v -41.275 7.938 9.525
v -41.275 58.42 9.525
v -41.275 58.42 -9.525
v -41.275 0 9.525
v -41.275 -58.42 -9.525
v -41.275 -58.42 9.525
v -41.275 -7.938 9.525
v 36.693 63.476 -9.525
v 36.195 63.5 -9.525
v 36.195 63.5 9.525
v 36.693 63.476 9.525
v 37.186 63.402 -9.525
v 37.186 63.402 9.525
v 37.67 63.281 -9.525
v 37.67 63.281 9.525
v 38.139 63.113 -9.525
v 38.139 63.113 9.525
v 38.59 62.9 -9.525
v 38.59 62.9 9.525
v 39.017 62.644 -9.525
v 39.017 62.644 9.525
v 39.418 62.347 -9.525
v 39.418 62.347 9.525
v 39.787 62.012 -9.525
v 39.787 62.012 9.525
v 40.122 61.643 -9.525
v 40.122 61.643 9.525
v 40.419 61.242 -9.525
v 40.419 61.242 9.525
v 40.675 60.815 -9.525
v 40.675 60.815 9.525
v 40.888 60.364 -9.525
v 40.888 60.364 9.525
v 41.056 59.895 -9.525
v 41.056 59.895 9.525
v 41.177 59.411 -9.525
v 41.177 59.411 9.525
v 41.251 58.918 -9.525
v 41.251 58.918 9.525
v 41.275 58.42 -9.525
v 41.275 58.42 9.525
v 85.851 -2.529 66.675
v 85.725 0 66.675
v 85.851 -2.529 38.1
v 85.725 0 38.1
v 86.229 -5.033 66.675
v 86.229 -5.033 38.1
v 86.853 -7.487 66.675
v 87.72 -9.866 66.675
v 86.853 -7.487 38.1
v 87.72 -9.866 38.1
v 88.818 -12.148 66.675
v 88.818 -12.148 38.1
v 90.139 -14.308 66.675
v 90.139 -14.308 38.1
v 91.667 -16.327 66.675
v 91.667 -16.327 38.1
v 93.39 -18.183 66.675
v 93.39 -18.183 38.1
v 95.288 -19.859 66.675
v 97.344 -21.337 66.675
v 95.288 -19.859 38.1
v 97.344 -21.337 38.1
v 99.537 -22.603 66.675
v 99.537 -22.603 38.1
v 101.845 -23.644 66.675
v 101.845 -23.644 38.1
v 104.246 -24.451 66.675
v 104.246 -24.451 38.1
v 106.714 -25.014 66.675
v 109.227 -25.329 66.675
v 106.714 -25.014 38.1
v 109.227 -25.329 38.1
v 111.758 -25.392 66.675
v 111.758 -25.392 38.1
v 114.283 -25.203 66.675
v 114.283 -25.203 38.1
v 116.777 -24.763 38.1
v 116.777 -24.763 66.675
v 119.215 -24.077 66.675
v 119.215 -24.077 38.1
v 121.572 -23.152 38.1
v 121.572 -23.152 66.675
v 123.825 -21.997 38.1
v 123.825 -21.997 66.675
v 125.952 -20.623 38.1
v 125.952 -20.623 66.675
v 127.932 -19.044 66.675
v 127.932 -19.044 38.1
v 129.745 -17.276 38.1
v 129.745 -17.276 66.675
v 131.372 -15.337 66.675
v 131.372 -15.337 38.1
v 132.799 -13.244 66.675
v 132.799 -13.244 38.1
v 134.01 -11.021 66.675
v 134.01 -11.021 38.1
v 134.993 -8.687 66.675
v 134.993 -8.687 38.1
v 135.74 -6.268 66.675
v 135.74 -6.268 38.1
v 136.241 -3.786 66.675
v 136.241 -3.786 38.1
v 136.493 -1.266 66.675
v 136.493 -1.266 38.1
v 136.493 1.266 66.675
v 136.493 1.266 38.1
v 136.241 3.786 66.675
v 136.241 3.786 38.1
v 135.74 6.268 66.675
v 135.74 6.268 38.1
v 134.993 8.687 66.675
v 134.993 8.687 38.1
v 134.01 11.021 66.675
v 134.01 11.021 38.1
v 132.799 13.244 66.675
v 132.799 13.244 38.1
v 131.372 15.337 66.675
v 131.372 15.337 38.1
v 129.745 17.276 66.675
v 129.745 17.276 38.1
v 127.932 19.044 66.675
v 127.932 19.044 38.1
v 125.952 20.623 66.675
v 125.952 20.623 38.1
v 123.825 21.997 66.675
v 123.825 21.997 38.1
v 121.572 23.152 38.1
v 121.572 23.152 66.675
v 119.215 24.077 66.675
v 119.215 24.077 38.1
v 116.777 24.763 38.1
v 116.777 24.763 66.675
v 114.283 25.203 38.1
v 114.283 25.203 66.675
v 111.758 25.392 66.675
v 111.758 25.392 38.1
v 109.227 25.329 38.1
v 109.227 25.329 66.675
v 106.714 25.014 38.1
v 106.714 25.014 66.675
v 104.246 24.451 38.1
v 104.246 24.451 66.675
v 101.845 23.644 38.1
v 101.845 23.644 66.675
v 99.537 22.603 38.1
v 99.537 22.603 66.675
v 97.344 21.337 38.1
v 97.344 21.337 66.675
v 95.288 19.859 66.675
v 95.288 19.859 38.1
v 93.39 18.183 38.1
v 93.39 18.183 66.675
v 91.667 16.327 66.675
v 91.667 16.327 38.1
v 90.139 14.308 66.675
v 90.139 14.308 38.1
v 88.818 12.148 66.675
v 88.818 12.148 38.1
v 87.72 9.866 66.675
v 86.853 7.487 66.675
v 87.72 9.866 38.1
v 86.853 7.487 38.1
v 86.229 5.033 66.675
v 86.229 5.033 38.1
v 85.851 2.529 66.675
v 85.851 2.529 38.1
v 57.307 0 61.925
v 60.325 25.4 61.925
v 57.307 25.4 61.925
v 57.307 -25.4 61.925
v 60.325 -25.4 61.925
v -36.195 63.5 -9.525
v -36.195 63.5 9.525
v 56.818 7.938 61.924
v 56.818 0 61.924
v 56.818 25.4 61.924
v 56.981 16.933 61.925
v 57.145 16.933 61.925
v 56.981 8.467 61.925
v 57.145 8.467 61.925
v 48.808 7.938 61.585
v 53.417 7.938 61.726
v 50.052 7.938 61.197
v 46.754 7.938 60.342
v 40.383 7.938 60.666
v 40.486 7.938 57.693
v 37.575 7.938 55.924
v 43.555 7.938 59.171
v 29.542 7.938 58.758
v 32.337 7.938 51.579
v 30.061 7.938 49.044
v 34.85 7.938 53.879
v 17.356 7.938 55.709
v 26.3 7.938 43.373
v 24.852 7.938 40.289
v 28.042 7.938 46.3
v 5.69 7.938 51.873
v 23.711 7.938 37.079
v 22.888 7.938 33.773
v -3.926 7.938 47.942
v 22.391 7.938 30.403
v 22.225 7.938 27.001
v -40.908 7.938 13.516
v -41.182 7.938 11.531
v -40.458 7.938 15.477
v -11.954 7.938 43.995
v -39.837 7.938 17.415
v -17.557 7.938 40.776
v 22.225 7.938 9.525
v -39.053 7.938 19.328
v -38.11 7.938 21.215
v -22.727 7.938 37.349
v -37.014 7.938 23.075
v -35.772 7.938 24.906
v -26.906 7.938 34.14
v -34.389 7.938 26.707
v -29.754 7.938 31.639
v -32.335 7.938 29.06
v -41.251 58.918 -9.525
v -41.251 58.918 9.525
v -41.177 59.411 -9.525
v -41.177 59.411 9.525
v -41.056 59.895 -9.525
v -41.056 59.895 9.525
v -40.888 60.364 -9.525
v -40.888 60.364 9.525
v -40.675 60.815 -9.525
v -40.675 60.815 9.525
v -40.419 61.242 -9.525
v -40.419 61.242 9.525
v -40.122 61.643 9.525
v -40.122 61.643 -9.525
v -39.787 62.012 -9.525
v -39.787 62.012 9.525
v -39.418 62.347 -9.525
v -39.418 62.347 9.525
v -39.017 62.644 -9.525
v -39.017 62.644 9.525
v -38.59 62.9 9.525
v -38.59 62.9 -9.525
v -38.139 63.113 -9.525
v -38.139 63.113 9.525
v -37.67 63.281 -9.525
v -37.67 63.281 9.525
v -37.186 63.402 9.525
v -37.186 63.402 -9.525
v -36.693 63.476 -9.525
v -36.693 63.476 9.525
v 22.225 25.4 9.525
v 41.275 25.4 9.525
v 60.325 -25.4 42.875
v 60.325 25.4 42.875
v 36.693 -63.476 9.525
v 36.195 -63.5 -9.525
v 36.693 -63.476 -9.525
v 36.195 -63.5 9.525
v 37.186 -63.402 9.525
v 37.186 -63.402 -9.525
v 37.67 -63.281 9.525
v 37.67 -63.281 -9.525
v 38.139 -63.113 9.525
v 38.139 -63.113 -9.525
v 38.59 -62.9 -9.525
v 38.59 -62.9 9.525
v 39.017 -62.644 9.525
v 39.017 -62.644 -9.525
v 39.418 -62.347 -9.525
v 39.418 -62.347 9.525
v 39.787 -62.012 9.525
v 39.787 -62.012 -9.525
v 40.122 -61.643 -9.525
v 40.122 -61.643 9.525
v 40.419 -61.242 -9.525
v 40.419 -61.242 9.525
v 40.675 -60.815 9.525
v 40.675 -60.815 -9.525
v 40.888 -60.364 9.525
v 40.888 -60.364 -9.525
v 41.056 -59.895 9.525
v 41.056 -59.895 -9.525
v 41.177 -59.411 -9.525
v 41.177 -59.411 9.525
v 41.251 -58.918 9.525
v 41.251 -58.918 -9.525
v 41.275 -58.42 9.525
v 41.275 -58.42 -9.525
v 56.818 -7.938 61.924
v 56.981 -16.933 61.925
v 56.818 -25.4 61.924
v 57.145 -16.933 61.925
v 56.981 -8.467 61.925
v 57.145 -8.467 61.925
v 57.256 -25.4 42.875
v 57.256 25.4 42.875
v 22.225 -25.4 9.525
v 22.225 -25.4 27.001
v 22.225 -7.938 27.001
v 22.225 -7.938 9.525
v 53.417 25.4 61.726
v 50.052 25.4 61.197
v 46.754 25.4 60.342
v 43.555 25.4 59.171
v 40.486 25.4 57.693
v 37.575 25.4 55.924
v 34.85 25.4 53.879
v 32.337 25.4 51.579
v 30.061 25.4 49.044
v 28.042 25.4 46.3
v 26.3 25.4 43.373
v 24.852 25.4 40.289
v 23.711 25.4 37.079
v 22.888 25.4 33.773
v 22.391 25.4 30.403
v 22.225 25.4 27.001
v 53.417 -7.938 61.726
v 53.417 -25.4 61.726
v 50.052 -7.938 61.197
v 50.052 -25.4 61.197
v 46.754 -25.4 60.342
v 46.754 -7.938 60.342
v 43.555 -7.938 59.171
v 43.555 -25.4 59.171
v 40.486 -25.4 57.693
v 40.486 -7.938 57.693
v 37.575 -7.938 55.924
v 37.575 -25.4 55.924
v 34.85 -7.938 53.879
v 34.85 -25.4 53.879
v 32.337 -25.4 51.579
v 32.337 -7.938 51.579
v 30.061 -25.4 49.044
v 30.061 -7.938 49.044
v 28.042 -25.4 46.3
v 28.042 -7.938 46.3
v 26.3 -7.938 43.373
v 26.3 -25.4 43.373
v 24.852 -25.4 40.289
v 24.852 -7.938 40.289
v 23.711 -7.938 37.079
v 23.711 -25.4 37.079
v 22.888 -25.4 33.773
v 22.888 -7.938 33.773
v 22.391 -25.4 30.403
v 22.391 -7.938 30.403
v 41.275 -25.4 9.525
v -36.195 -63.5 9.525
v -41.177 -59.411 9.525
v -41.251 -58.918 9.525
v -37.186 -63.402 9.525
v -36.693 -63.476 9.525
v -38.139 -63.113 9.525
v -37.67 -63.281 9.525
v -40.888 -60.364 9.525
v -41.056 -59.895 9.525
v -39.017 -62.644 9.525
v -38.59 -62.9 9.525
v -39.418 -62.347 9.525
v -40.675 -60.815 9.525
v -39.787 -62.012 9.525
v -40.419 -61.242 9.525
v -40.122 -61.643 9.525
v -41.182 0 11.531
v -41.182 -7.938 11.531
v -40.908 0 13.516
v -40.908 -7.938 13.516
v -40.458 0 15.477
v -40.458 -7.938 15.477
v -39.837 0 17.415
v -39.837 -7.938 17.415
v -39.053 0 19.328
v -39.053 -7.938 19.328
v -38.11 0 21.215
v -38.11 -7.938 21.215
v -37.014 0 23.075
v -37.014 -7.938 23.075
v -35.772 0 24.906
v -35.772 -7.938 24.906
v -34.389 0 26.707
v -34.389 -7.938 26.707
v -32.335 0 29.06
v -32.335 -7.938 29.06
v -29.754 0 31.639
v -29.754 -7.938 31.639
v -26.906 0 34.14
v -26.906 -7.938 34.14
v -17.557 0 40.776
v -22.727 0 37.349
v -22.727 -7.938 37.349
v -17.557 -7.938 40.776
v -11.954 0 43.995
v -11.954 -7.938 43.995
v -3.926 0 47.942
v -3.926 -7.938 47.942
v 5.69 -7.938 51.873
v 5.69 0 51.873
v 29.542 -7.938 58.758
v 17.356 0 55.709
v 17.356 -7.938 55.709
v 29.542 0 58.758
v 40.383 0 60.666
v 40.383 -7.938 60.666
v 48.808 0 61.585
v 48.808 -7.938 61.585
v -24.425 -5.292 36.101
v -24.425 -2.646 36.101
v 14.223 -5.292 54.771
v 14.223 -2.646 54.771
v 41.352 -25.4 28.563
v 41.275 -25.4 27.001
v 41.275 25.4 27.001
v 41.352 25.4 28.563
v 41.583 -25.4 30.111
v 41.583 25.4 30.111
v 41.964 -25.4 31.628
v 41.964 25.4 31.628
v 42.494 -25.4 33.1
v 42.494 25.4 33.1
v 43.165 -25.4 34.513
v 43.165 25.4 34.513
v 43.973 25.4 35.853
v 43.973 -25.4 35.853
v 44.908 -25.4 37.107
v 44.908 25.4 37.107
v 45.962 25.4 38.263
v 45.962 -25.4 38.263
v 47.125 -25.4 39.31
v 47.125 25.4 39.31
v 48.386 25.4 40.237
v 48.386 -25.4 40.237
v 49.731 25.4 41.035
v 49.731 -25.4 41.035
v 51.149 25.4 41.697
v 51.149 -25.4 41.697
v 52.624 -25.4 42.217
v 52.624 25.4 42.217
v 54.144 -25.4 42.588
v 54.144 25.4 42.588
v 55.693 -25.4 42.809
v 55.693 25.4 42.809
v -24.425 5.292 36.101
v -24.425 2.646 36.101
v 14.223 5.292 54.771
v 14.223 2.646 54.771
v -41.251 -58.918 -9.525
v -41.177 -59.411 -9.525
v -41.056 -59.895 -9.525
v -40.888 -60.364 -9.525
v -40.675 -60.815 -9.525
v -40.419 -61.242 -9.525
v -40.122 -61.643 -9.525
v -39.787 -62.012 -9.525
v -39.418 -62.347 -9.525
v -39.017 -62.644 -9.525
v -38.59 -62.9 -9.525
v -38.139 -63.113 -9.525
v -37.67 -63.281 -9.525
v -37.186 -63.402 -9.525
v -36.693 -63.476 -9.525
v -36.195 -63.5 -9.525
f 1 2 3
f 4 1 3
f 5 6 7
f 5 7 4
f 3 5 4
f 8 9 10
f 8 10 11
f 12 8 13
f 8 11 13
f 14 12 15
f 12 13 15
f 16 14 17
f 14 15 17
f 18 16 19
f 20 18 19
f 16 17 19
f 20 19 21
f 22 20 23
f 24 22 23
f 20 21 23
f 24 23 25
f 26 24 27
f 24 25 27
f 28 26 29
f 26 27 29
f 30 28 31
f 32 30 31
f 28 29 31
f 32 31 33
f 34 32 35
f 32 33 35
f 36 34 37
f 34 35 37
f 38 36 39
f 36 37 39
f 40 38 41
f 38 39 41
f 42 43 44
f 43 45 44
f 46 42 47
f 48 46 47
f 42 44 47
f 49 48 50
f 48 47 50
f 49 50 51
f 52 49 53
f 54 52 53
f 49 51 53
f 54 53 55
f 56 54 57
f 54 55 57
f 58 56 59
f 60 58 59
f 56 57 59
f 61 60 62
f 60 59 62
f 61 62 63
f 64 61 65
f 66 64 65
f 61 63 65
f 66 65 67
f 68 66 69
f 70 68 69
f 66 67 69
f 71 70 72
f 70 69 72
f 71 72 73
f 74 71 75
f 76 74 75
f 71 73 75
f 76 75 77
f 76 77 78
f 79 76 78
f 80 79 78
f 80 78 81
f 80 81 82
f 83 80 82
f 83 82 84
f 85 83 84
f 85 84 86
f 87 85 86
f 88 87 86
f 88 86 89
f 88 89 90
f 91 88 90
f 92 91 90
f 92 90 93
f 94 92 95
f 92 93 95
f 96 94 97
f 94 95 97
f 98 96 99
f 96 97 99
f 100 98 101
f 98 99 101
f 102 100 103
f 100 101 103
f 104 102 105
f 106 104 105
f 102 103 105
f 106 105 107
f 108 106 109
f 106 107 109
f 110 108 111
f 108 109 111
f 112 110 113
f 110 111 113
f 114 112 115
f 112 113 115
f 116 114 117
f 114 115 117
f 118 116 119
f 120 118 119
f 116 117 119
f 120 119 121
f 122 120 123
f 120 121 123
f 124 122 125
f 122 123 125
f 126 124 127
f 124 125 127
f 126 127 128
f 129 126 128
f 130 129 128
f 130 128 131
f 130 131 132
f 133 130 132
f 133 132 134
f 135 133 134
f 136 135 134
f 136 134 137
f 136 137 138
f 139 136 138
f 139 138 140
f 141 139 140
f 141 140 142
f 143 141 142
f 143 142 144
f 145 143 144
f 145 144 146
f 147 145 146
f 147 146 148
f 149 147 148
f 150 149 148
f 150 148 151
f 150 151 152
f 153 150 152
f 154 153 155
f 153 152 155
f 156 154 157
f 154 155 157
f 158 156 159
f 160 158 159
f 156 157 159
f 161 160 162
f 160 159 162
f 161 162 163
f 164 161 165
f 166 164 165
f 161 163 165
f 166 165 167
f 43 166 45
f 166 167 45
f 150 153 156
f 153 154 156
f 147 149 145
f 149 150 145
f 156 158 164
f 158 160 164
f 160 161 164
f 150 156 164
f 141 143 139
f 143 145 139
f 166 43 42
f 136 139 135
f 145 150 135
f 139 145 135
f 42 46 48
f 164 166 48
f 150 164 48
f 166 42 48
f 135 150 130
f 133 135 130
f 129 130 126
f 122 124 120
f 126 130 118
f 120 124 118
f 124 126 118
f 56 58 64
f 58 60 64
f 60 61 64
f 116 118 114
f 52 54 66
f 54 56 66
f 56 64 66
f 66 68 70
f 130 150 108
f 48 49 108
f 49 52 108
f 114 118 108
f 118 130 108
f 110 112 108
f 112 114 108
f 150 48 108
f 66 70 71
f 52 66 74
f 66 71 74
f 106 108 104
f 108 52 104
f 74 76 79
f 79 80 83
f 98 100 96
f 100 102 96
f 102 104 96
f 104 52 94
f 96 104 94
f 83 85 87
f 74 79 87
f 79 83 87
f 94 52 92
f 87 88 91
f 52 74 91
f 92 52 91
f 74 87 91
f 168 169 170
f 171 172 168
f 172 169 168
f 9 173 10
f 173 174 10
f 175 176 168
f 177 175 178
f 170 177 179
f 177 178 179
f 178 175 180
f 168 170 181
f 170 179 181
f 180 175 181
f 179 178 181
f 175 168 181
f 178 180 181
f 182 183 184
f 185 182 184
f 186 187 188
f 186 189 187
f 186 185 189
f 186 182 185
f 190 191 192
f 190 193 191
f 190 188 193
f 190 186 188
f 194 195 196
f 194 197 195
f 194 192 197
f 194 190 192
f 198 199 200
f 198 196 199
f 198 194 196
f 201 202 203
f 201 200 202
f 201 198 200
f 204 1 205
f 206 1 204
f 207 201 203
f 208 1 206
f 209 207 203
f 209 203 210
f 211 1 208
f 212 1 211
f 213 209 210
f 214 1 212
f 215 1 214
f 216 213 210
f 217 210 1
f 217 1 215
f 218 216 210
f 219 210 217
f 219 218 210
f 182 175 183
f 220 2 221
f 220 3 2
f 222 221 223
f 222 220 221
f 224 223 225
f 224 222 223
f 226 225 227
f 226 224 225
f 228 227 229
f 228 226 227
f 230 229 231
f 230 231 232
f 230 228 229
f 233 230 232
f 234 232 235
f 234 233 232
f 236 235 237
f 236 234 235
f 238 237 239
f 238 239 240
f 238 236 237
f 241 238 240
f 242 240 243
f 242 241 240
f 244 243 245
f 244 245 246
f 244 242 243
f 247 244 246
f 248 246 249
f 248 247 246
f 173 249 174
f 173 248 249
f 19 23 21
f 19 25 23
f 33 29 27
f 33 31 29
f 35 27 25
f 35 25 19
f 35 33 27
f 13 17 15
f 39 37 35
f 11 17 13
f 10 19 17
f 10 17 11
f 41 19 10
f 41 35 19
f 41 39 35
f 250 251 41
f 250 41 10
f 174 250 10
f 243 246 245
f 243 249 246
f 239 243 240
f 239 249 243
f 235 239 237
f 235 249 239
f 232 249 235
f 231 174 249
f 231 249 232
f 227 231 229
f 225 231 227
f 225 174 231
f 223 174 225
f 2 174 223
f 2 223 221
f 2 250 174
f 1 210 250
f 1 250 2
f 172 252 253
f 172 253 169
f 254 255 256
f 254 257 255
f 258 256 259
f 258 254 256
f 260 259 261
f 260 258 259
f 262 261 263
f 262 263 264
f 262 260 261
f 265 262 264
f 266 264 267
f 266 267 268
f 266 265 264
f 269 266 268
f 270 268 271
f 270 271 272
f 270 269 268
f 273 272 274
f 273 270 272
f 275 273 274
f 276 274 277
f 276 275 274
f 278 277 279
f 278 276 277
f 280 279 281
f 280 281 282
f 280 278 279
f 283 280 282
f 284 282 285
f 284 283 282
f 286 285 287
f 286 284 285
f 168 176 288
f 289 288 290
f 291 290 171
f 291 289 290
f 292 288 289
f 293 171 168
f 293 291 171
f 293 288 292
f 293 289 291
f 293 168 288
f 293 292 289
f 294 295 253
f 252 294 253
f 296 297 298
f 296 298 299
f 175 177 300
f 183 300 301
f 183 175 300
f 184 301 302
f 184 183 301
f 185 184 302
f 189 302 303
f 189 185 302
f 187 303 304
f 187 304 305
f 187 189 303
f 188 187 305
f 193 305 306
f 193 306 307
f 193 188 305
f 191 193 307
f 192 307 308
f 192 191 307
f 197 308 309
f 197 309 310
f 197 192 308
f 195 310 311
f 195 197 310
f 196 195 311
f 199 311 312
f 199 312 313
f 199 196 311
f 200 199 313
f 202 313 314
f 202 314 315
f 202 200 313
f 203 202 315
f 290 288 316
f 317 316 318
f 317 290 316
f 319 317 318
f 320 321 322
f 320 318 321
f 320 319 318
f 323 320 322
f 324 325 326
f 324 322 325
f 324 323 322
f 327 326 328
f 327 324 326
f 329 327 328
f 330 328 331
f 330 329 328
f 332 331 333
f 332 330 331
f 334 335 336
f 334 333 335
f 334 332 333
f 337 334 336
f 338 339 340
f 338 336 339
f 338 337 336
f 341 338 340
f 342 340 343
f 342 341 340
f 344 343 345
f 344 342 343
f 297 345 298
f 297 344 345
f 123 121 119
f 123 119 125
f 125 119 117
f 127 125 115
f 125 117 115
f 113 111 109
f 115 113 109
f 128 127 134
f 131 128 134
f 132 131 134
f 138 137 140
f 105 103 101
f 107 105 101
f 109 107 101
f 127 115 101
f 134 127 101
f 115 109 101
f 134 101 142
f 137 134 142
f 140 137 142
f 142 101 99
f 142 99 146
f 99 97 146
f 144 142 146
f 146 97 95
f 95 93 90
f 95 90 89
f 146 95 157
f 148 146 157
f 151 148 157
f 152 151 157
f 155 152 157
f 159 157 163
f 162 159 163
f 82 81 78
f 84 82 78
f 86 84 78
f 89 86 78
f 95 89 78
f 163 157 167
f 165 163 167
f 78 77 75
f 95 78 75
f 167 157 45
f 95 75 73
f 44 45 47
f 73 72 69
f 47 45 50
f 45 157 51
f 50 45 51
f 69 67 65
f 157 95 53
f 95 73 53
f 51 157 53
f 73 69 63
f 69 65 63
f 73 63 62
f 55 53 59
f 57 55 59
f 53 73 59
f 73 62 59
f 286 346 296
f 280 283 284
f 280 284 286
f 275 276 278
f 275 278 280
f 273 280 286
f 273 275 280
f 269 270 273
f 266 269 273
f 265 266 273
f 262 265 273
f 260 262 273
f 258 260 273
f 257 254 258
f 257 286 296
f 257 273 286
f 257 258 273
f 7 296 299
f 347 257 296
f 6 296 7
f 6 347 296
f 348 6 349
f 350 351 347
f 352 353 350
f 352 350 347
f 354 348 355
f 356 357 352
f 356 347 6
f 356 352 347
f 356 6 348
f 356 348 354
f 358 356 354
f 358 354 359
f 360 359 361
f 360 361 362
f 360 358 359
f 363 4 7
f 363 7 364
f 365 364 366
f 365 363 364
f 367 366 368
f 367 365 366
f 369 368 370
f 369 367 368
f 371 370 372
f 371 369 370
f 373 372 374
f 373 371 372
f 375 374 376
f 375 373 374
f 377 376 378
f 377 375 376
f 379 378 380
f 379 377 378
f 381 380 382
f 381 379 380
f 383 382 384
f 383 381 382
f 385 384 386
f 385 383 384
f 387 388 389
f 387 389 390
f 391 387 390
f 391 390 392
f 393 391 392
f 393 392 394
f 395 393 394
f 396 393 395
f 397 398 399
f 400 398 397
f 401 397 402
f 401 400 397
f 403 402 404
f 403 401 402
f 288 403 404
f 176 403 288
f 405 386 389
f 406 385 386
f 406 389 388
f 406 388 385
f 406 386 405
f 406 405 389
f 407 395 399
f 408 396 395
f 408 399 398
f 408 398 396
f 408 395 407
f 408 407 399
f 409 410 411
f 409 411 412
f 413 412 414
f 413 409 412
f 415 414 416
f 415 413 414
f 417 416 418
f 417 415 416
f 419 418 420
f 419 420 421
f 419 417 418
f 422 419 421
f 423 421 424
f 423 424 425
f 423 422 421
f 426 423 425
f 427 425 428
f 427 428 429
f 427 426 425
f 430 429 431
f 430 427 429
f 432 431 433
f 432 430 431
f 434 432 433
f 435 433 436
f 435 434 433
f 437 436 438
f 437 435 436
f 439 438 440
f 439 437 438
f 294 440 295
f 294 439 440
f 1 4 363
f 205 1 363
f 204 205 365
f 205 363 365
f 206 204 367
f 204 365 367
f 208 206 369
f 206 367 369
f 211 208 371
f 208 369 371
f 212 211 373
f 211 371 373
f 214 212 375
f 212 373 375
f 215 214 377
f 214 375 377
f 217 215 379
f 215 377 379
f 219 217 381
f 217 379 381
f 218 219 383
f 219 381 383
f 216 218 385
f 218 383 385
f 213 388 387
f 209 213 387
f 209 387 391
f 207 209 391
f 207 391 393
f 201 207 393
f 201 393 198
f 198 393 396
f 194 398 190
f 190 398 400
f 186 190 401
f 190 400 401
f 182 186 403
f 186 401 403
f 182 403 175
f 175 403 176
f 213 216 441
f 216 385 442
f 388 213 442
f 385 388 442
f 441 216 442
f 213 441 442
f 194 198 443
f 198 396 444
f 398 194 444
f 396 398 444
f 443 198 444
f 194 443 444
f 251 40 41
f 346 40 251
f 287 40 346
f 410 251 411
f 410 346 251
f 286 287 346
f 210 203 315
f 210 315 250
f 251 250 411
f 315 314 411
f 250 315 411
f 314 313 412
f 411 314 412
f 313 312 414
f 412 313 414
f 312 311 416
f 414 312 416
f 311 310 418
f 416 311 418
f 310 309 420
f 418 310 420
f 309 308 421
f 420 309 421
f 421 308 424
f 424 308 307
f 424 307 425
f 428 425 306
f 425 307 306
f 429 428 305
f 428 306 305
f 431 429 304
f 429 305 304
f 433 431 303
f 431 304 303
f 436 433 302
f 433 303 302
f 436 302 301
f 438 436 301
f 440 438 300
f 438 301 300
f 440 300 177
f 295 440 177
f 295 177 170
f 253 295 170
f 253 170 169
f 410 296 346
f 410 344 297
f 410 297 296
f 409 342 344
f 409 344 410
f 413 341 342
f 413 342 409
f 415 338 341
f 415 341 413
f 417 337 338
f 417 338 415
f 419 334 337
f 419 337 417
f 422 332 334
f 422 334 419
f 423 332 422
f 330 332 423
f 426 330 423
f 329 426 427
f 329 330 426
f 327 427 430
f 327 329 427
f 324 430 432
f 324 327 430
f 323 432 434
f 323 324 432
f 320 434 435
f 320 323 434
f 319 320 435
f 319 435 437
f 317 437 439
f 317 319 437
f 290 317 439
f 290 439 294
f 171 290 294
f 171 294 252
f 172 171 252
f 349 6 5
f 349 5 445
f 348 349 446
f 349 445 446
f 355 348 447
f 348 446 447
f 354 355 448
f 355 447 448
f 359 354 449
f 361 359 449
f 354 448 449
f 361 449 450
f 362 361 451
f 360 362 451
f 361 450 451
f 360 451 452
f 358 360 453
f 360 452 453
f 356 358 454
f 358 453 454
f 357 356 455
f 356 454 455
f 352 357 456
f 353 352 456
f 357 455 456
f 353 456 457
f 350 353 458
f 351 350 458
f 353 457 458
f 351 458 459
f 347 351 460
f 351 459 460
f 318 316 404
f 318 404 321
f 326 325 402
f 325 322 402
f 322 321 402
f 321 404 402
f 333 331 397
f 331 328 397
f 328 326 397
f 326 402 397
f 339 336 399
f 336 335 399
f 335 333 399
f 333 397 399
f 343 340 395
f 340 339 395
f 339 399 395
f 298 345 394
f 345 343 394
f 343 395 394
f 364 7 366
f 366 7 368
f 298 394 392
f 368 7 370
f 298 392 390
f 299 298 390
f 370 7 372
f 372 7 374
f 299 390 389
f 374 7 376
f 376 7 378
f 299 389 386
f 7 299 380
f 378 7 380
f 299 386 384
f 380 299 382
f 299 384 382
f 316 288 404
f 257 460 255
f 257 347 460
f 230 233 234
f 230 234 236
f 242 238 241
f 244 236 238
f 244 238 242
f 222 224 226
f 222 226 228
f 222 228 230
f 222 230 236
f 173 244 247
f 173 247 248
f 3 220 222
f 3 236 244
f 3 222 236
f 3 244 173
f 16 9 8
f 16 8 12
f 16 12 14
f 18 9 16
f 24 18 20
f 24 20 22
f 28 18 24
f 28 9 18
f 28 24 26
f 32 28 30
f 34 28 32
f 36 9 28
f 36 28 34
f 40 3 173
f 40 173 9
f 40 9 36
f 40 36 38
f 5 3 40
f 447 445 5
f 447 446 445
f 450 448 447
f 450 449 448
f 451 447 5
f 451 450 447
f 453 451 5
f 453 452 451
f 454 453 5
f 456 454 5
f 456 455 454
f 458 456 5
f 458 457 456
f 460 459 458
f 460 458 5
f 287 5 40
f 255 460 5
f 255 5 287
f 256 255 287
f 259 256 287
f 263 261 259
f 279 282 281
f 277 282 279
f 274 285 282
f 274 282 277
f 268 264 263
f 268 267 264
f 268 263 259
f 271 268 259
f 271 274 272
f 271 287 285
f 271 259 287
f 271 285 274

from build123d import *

# Parameters (mm, degrees)
F1_DEPTH = 63.5
F2_DEPTH = 25.4
F3_DEPTH = 7.9375
F5_R     = 5.08


with BuildPart() as f1:
    # F0 (on Front) → F1 (new body, symmetric)
    with BuildSketch(Plane.XZ):
        Polygon((-41.275, 9.525), (-41.275, -9.525), (41.275, -9.525), (41.275, 9.525), (22.225, 9.525), align=None)
    extrude(amount=F1_DEPTH, both=True)

    # F0 (on Front) → F2 (join, symmetric)
    with BuildSketch(Plane.XZ):
        with BuildLine():
            Line((22.225, 9.525), (41.275, 9.525))
            Line((41.275, 9.525), (41.275, 27.000555))
            ThreePointArc((41.275, 27.000555), (45.96226, 38.263329), (57.256114, 42.8752))
            Line((57.256114, 42.8752), (60.325, 42.8752))
            Line((60.325, 42.8752), (60.325, 61.9252))
            Line((60.325, 61.9252), (57.307393, 61.9252))
            add(Edge.make_bspline(
                [(56.818173, 61.923978), (56.981622, 61.924792), (57.144697, 61.9252), (57.307393, 61.9252)],
                knots=[111.172952, 111.172952, 111.172952, 111.172952, 111.643491, 111.643491, 111.643491, 111.643491], degree=3))
            ThreePointArc((56.818173, 61.923978), (32.337254, 51.57866), (22.225, 27.000555))
            Line((22.225, 27.000555), (22.225, 9.525))
        make_face()
    extrude(amount=F2_DEPTH, both=True)

    # F0 (on Front) → F3 (join, symmetric)
    with BuildSketch(Plane.XZ):
        with BuildLine():
            add(Edge.make_bspline(
                [(-41.275, 9.525), (-41.275, 38.851558), (18.200547, 61.731636), (56.818173, 61.923978)],
                knots=[0, 0, 0, 0, 111.172952, 111.172952, 111.172952, 111.172952], degree=3))
            Line((-41.275, 9.525), (22.225, 9.525))
            Line((22.225, 9.525), (22.225, 27.000555))
            ThreePointArc((22.225, 27.000555), (32.337254, 51.57866), (56.818173, 61.923978))
        make_face()
    extrude(amount=F3_DEPTH, both=True)

    # F5
    f5_edges = [f1.edges().sort_by_distance(p)[0] for p in [
        (41.275, -63.5, 0),
        (-41.275, -63.5, 0),
        (41.275, 63.5, 0),
        (-41.275, 63.5, 0),
    ]]
    fillet(f5_edges, radius=F5_R)


with BuildPart() as f4:
    # F0 (on Front) → F4 (revolve)
    with BuildSketch(Plane.XZ):
        Polygon((85.725, 66.675), (85.725, 61.9252), (85.725, 42.8752), (85.725, 38.1), (111.125, 38.1), (111.125, 66.675), align=None)
    revolve(axis=Axis((111.125, 0, 52.3875), (0, 0, 1)))


solid = Compound([f1.part, f4.part])
